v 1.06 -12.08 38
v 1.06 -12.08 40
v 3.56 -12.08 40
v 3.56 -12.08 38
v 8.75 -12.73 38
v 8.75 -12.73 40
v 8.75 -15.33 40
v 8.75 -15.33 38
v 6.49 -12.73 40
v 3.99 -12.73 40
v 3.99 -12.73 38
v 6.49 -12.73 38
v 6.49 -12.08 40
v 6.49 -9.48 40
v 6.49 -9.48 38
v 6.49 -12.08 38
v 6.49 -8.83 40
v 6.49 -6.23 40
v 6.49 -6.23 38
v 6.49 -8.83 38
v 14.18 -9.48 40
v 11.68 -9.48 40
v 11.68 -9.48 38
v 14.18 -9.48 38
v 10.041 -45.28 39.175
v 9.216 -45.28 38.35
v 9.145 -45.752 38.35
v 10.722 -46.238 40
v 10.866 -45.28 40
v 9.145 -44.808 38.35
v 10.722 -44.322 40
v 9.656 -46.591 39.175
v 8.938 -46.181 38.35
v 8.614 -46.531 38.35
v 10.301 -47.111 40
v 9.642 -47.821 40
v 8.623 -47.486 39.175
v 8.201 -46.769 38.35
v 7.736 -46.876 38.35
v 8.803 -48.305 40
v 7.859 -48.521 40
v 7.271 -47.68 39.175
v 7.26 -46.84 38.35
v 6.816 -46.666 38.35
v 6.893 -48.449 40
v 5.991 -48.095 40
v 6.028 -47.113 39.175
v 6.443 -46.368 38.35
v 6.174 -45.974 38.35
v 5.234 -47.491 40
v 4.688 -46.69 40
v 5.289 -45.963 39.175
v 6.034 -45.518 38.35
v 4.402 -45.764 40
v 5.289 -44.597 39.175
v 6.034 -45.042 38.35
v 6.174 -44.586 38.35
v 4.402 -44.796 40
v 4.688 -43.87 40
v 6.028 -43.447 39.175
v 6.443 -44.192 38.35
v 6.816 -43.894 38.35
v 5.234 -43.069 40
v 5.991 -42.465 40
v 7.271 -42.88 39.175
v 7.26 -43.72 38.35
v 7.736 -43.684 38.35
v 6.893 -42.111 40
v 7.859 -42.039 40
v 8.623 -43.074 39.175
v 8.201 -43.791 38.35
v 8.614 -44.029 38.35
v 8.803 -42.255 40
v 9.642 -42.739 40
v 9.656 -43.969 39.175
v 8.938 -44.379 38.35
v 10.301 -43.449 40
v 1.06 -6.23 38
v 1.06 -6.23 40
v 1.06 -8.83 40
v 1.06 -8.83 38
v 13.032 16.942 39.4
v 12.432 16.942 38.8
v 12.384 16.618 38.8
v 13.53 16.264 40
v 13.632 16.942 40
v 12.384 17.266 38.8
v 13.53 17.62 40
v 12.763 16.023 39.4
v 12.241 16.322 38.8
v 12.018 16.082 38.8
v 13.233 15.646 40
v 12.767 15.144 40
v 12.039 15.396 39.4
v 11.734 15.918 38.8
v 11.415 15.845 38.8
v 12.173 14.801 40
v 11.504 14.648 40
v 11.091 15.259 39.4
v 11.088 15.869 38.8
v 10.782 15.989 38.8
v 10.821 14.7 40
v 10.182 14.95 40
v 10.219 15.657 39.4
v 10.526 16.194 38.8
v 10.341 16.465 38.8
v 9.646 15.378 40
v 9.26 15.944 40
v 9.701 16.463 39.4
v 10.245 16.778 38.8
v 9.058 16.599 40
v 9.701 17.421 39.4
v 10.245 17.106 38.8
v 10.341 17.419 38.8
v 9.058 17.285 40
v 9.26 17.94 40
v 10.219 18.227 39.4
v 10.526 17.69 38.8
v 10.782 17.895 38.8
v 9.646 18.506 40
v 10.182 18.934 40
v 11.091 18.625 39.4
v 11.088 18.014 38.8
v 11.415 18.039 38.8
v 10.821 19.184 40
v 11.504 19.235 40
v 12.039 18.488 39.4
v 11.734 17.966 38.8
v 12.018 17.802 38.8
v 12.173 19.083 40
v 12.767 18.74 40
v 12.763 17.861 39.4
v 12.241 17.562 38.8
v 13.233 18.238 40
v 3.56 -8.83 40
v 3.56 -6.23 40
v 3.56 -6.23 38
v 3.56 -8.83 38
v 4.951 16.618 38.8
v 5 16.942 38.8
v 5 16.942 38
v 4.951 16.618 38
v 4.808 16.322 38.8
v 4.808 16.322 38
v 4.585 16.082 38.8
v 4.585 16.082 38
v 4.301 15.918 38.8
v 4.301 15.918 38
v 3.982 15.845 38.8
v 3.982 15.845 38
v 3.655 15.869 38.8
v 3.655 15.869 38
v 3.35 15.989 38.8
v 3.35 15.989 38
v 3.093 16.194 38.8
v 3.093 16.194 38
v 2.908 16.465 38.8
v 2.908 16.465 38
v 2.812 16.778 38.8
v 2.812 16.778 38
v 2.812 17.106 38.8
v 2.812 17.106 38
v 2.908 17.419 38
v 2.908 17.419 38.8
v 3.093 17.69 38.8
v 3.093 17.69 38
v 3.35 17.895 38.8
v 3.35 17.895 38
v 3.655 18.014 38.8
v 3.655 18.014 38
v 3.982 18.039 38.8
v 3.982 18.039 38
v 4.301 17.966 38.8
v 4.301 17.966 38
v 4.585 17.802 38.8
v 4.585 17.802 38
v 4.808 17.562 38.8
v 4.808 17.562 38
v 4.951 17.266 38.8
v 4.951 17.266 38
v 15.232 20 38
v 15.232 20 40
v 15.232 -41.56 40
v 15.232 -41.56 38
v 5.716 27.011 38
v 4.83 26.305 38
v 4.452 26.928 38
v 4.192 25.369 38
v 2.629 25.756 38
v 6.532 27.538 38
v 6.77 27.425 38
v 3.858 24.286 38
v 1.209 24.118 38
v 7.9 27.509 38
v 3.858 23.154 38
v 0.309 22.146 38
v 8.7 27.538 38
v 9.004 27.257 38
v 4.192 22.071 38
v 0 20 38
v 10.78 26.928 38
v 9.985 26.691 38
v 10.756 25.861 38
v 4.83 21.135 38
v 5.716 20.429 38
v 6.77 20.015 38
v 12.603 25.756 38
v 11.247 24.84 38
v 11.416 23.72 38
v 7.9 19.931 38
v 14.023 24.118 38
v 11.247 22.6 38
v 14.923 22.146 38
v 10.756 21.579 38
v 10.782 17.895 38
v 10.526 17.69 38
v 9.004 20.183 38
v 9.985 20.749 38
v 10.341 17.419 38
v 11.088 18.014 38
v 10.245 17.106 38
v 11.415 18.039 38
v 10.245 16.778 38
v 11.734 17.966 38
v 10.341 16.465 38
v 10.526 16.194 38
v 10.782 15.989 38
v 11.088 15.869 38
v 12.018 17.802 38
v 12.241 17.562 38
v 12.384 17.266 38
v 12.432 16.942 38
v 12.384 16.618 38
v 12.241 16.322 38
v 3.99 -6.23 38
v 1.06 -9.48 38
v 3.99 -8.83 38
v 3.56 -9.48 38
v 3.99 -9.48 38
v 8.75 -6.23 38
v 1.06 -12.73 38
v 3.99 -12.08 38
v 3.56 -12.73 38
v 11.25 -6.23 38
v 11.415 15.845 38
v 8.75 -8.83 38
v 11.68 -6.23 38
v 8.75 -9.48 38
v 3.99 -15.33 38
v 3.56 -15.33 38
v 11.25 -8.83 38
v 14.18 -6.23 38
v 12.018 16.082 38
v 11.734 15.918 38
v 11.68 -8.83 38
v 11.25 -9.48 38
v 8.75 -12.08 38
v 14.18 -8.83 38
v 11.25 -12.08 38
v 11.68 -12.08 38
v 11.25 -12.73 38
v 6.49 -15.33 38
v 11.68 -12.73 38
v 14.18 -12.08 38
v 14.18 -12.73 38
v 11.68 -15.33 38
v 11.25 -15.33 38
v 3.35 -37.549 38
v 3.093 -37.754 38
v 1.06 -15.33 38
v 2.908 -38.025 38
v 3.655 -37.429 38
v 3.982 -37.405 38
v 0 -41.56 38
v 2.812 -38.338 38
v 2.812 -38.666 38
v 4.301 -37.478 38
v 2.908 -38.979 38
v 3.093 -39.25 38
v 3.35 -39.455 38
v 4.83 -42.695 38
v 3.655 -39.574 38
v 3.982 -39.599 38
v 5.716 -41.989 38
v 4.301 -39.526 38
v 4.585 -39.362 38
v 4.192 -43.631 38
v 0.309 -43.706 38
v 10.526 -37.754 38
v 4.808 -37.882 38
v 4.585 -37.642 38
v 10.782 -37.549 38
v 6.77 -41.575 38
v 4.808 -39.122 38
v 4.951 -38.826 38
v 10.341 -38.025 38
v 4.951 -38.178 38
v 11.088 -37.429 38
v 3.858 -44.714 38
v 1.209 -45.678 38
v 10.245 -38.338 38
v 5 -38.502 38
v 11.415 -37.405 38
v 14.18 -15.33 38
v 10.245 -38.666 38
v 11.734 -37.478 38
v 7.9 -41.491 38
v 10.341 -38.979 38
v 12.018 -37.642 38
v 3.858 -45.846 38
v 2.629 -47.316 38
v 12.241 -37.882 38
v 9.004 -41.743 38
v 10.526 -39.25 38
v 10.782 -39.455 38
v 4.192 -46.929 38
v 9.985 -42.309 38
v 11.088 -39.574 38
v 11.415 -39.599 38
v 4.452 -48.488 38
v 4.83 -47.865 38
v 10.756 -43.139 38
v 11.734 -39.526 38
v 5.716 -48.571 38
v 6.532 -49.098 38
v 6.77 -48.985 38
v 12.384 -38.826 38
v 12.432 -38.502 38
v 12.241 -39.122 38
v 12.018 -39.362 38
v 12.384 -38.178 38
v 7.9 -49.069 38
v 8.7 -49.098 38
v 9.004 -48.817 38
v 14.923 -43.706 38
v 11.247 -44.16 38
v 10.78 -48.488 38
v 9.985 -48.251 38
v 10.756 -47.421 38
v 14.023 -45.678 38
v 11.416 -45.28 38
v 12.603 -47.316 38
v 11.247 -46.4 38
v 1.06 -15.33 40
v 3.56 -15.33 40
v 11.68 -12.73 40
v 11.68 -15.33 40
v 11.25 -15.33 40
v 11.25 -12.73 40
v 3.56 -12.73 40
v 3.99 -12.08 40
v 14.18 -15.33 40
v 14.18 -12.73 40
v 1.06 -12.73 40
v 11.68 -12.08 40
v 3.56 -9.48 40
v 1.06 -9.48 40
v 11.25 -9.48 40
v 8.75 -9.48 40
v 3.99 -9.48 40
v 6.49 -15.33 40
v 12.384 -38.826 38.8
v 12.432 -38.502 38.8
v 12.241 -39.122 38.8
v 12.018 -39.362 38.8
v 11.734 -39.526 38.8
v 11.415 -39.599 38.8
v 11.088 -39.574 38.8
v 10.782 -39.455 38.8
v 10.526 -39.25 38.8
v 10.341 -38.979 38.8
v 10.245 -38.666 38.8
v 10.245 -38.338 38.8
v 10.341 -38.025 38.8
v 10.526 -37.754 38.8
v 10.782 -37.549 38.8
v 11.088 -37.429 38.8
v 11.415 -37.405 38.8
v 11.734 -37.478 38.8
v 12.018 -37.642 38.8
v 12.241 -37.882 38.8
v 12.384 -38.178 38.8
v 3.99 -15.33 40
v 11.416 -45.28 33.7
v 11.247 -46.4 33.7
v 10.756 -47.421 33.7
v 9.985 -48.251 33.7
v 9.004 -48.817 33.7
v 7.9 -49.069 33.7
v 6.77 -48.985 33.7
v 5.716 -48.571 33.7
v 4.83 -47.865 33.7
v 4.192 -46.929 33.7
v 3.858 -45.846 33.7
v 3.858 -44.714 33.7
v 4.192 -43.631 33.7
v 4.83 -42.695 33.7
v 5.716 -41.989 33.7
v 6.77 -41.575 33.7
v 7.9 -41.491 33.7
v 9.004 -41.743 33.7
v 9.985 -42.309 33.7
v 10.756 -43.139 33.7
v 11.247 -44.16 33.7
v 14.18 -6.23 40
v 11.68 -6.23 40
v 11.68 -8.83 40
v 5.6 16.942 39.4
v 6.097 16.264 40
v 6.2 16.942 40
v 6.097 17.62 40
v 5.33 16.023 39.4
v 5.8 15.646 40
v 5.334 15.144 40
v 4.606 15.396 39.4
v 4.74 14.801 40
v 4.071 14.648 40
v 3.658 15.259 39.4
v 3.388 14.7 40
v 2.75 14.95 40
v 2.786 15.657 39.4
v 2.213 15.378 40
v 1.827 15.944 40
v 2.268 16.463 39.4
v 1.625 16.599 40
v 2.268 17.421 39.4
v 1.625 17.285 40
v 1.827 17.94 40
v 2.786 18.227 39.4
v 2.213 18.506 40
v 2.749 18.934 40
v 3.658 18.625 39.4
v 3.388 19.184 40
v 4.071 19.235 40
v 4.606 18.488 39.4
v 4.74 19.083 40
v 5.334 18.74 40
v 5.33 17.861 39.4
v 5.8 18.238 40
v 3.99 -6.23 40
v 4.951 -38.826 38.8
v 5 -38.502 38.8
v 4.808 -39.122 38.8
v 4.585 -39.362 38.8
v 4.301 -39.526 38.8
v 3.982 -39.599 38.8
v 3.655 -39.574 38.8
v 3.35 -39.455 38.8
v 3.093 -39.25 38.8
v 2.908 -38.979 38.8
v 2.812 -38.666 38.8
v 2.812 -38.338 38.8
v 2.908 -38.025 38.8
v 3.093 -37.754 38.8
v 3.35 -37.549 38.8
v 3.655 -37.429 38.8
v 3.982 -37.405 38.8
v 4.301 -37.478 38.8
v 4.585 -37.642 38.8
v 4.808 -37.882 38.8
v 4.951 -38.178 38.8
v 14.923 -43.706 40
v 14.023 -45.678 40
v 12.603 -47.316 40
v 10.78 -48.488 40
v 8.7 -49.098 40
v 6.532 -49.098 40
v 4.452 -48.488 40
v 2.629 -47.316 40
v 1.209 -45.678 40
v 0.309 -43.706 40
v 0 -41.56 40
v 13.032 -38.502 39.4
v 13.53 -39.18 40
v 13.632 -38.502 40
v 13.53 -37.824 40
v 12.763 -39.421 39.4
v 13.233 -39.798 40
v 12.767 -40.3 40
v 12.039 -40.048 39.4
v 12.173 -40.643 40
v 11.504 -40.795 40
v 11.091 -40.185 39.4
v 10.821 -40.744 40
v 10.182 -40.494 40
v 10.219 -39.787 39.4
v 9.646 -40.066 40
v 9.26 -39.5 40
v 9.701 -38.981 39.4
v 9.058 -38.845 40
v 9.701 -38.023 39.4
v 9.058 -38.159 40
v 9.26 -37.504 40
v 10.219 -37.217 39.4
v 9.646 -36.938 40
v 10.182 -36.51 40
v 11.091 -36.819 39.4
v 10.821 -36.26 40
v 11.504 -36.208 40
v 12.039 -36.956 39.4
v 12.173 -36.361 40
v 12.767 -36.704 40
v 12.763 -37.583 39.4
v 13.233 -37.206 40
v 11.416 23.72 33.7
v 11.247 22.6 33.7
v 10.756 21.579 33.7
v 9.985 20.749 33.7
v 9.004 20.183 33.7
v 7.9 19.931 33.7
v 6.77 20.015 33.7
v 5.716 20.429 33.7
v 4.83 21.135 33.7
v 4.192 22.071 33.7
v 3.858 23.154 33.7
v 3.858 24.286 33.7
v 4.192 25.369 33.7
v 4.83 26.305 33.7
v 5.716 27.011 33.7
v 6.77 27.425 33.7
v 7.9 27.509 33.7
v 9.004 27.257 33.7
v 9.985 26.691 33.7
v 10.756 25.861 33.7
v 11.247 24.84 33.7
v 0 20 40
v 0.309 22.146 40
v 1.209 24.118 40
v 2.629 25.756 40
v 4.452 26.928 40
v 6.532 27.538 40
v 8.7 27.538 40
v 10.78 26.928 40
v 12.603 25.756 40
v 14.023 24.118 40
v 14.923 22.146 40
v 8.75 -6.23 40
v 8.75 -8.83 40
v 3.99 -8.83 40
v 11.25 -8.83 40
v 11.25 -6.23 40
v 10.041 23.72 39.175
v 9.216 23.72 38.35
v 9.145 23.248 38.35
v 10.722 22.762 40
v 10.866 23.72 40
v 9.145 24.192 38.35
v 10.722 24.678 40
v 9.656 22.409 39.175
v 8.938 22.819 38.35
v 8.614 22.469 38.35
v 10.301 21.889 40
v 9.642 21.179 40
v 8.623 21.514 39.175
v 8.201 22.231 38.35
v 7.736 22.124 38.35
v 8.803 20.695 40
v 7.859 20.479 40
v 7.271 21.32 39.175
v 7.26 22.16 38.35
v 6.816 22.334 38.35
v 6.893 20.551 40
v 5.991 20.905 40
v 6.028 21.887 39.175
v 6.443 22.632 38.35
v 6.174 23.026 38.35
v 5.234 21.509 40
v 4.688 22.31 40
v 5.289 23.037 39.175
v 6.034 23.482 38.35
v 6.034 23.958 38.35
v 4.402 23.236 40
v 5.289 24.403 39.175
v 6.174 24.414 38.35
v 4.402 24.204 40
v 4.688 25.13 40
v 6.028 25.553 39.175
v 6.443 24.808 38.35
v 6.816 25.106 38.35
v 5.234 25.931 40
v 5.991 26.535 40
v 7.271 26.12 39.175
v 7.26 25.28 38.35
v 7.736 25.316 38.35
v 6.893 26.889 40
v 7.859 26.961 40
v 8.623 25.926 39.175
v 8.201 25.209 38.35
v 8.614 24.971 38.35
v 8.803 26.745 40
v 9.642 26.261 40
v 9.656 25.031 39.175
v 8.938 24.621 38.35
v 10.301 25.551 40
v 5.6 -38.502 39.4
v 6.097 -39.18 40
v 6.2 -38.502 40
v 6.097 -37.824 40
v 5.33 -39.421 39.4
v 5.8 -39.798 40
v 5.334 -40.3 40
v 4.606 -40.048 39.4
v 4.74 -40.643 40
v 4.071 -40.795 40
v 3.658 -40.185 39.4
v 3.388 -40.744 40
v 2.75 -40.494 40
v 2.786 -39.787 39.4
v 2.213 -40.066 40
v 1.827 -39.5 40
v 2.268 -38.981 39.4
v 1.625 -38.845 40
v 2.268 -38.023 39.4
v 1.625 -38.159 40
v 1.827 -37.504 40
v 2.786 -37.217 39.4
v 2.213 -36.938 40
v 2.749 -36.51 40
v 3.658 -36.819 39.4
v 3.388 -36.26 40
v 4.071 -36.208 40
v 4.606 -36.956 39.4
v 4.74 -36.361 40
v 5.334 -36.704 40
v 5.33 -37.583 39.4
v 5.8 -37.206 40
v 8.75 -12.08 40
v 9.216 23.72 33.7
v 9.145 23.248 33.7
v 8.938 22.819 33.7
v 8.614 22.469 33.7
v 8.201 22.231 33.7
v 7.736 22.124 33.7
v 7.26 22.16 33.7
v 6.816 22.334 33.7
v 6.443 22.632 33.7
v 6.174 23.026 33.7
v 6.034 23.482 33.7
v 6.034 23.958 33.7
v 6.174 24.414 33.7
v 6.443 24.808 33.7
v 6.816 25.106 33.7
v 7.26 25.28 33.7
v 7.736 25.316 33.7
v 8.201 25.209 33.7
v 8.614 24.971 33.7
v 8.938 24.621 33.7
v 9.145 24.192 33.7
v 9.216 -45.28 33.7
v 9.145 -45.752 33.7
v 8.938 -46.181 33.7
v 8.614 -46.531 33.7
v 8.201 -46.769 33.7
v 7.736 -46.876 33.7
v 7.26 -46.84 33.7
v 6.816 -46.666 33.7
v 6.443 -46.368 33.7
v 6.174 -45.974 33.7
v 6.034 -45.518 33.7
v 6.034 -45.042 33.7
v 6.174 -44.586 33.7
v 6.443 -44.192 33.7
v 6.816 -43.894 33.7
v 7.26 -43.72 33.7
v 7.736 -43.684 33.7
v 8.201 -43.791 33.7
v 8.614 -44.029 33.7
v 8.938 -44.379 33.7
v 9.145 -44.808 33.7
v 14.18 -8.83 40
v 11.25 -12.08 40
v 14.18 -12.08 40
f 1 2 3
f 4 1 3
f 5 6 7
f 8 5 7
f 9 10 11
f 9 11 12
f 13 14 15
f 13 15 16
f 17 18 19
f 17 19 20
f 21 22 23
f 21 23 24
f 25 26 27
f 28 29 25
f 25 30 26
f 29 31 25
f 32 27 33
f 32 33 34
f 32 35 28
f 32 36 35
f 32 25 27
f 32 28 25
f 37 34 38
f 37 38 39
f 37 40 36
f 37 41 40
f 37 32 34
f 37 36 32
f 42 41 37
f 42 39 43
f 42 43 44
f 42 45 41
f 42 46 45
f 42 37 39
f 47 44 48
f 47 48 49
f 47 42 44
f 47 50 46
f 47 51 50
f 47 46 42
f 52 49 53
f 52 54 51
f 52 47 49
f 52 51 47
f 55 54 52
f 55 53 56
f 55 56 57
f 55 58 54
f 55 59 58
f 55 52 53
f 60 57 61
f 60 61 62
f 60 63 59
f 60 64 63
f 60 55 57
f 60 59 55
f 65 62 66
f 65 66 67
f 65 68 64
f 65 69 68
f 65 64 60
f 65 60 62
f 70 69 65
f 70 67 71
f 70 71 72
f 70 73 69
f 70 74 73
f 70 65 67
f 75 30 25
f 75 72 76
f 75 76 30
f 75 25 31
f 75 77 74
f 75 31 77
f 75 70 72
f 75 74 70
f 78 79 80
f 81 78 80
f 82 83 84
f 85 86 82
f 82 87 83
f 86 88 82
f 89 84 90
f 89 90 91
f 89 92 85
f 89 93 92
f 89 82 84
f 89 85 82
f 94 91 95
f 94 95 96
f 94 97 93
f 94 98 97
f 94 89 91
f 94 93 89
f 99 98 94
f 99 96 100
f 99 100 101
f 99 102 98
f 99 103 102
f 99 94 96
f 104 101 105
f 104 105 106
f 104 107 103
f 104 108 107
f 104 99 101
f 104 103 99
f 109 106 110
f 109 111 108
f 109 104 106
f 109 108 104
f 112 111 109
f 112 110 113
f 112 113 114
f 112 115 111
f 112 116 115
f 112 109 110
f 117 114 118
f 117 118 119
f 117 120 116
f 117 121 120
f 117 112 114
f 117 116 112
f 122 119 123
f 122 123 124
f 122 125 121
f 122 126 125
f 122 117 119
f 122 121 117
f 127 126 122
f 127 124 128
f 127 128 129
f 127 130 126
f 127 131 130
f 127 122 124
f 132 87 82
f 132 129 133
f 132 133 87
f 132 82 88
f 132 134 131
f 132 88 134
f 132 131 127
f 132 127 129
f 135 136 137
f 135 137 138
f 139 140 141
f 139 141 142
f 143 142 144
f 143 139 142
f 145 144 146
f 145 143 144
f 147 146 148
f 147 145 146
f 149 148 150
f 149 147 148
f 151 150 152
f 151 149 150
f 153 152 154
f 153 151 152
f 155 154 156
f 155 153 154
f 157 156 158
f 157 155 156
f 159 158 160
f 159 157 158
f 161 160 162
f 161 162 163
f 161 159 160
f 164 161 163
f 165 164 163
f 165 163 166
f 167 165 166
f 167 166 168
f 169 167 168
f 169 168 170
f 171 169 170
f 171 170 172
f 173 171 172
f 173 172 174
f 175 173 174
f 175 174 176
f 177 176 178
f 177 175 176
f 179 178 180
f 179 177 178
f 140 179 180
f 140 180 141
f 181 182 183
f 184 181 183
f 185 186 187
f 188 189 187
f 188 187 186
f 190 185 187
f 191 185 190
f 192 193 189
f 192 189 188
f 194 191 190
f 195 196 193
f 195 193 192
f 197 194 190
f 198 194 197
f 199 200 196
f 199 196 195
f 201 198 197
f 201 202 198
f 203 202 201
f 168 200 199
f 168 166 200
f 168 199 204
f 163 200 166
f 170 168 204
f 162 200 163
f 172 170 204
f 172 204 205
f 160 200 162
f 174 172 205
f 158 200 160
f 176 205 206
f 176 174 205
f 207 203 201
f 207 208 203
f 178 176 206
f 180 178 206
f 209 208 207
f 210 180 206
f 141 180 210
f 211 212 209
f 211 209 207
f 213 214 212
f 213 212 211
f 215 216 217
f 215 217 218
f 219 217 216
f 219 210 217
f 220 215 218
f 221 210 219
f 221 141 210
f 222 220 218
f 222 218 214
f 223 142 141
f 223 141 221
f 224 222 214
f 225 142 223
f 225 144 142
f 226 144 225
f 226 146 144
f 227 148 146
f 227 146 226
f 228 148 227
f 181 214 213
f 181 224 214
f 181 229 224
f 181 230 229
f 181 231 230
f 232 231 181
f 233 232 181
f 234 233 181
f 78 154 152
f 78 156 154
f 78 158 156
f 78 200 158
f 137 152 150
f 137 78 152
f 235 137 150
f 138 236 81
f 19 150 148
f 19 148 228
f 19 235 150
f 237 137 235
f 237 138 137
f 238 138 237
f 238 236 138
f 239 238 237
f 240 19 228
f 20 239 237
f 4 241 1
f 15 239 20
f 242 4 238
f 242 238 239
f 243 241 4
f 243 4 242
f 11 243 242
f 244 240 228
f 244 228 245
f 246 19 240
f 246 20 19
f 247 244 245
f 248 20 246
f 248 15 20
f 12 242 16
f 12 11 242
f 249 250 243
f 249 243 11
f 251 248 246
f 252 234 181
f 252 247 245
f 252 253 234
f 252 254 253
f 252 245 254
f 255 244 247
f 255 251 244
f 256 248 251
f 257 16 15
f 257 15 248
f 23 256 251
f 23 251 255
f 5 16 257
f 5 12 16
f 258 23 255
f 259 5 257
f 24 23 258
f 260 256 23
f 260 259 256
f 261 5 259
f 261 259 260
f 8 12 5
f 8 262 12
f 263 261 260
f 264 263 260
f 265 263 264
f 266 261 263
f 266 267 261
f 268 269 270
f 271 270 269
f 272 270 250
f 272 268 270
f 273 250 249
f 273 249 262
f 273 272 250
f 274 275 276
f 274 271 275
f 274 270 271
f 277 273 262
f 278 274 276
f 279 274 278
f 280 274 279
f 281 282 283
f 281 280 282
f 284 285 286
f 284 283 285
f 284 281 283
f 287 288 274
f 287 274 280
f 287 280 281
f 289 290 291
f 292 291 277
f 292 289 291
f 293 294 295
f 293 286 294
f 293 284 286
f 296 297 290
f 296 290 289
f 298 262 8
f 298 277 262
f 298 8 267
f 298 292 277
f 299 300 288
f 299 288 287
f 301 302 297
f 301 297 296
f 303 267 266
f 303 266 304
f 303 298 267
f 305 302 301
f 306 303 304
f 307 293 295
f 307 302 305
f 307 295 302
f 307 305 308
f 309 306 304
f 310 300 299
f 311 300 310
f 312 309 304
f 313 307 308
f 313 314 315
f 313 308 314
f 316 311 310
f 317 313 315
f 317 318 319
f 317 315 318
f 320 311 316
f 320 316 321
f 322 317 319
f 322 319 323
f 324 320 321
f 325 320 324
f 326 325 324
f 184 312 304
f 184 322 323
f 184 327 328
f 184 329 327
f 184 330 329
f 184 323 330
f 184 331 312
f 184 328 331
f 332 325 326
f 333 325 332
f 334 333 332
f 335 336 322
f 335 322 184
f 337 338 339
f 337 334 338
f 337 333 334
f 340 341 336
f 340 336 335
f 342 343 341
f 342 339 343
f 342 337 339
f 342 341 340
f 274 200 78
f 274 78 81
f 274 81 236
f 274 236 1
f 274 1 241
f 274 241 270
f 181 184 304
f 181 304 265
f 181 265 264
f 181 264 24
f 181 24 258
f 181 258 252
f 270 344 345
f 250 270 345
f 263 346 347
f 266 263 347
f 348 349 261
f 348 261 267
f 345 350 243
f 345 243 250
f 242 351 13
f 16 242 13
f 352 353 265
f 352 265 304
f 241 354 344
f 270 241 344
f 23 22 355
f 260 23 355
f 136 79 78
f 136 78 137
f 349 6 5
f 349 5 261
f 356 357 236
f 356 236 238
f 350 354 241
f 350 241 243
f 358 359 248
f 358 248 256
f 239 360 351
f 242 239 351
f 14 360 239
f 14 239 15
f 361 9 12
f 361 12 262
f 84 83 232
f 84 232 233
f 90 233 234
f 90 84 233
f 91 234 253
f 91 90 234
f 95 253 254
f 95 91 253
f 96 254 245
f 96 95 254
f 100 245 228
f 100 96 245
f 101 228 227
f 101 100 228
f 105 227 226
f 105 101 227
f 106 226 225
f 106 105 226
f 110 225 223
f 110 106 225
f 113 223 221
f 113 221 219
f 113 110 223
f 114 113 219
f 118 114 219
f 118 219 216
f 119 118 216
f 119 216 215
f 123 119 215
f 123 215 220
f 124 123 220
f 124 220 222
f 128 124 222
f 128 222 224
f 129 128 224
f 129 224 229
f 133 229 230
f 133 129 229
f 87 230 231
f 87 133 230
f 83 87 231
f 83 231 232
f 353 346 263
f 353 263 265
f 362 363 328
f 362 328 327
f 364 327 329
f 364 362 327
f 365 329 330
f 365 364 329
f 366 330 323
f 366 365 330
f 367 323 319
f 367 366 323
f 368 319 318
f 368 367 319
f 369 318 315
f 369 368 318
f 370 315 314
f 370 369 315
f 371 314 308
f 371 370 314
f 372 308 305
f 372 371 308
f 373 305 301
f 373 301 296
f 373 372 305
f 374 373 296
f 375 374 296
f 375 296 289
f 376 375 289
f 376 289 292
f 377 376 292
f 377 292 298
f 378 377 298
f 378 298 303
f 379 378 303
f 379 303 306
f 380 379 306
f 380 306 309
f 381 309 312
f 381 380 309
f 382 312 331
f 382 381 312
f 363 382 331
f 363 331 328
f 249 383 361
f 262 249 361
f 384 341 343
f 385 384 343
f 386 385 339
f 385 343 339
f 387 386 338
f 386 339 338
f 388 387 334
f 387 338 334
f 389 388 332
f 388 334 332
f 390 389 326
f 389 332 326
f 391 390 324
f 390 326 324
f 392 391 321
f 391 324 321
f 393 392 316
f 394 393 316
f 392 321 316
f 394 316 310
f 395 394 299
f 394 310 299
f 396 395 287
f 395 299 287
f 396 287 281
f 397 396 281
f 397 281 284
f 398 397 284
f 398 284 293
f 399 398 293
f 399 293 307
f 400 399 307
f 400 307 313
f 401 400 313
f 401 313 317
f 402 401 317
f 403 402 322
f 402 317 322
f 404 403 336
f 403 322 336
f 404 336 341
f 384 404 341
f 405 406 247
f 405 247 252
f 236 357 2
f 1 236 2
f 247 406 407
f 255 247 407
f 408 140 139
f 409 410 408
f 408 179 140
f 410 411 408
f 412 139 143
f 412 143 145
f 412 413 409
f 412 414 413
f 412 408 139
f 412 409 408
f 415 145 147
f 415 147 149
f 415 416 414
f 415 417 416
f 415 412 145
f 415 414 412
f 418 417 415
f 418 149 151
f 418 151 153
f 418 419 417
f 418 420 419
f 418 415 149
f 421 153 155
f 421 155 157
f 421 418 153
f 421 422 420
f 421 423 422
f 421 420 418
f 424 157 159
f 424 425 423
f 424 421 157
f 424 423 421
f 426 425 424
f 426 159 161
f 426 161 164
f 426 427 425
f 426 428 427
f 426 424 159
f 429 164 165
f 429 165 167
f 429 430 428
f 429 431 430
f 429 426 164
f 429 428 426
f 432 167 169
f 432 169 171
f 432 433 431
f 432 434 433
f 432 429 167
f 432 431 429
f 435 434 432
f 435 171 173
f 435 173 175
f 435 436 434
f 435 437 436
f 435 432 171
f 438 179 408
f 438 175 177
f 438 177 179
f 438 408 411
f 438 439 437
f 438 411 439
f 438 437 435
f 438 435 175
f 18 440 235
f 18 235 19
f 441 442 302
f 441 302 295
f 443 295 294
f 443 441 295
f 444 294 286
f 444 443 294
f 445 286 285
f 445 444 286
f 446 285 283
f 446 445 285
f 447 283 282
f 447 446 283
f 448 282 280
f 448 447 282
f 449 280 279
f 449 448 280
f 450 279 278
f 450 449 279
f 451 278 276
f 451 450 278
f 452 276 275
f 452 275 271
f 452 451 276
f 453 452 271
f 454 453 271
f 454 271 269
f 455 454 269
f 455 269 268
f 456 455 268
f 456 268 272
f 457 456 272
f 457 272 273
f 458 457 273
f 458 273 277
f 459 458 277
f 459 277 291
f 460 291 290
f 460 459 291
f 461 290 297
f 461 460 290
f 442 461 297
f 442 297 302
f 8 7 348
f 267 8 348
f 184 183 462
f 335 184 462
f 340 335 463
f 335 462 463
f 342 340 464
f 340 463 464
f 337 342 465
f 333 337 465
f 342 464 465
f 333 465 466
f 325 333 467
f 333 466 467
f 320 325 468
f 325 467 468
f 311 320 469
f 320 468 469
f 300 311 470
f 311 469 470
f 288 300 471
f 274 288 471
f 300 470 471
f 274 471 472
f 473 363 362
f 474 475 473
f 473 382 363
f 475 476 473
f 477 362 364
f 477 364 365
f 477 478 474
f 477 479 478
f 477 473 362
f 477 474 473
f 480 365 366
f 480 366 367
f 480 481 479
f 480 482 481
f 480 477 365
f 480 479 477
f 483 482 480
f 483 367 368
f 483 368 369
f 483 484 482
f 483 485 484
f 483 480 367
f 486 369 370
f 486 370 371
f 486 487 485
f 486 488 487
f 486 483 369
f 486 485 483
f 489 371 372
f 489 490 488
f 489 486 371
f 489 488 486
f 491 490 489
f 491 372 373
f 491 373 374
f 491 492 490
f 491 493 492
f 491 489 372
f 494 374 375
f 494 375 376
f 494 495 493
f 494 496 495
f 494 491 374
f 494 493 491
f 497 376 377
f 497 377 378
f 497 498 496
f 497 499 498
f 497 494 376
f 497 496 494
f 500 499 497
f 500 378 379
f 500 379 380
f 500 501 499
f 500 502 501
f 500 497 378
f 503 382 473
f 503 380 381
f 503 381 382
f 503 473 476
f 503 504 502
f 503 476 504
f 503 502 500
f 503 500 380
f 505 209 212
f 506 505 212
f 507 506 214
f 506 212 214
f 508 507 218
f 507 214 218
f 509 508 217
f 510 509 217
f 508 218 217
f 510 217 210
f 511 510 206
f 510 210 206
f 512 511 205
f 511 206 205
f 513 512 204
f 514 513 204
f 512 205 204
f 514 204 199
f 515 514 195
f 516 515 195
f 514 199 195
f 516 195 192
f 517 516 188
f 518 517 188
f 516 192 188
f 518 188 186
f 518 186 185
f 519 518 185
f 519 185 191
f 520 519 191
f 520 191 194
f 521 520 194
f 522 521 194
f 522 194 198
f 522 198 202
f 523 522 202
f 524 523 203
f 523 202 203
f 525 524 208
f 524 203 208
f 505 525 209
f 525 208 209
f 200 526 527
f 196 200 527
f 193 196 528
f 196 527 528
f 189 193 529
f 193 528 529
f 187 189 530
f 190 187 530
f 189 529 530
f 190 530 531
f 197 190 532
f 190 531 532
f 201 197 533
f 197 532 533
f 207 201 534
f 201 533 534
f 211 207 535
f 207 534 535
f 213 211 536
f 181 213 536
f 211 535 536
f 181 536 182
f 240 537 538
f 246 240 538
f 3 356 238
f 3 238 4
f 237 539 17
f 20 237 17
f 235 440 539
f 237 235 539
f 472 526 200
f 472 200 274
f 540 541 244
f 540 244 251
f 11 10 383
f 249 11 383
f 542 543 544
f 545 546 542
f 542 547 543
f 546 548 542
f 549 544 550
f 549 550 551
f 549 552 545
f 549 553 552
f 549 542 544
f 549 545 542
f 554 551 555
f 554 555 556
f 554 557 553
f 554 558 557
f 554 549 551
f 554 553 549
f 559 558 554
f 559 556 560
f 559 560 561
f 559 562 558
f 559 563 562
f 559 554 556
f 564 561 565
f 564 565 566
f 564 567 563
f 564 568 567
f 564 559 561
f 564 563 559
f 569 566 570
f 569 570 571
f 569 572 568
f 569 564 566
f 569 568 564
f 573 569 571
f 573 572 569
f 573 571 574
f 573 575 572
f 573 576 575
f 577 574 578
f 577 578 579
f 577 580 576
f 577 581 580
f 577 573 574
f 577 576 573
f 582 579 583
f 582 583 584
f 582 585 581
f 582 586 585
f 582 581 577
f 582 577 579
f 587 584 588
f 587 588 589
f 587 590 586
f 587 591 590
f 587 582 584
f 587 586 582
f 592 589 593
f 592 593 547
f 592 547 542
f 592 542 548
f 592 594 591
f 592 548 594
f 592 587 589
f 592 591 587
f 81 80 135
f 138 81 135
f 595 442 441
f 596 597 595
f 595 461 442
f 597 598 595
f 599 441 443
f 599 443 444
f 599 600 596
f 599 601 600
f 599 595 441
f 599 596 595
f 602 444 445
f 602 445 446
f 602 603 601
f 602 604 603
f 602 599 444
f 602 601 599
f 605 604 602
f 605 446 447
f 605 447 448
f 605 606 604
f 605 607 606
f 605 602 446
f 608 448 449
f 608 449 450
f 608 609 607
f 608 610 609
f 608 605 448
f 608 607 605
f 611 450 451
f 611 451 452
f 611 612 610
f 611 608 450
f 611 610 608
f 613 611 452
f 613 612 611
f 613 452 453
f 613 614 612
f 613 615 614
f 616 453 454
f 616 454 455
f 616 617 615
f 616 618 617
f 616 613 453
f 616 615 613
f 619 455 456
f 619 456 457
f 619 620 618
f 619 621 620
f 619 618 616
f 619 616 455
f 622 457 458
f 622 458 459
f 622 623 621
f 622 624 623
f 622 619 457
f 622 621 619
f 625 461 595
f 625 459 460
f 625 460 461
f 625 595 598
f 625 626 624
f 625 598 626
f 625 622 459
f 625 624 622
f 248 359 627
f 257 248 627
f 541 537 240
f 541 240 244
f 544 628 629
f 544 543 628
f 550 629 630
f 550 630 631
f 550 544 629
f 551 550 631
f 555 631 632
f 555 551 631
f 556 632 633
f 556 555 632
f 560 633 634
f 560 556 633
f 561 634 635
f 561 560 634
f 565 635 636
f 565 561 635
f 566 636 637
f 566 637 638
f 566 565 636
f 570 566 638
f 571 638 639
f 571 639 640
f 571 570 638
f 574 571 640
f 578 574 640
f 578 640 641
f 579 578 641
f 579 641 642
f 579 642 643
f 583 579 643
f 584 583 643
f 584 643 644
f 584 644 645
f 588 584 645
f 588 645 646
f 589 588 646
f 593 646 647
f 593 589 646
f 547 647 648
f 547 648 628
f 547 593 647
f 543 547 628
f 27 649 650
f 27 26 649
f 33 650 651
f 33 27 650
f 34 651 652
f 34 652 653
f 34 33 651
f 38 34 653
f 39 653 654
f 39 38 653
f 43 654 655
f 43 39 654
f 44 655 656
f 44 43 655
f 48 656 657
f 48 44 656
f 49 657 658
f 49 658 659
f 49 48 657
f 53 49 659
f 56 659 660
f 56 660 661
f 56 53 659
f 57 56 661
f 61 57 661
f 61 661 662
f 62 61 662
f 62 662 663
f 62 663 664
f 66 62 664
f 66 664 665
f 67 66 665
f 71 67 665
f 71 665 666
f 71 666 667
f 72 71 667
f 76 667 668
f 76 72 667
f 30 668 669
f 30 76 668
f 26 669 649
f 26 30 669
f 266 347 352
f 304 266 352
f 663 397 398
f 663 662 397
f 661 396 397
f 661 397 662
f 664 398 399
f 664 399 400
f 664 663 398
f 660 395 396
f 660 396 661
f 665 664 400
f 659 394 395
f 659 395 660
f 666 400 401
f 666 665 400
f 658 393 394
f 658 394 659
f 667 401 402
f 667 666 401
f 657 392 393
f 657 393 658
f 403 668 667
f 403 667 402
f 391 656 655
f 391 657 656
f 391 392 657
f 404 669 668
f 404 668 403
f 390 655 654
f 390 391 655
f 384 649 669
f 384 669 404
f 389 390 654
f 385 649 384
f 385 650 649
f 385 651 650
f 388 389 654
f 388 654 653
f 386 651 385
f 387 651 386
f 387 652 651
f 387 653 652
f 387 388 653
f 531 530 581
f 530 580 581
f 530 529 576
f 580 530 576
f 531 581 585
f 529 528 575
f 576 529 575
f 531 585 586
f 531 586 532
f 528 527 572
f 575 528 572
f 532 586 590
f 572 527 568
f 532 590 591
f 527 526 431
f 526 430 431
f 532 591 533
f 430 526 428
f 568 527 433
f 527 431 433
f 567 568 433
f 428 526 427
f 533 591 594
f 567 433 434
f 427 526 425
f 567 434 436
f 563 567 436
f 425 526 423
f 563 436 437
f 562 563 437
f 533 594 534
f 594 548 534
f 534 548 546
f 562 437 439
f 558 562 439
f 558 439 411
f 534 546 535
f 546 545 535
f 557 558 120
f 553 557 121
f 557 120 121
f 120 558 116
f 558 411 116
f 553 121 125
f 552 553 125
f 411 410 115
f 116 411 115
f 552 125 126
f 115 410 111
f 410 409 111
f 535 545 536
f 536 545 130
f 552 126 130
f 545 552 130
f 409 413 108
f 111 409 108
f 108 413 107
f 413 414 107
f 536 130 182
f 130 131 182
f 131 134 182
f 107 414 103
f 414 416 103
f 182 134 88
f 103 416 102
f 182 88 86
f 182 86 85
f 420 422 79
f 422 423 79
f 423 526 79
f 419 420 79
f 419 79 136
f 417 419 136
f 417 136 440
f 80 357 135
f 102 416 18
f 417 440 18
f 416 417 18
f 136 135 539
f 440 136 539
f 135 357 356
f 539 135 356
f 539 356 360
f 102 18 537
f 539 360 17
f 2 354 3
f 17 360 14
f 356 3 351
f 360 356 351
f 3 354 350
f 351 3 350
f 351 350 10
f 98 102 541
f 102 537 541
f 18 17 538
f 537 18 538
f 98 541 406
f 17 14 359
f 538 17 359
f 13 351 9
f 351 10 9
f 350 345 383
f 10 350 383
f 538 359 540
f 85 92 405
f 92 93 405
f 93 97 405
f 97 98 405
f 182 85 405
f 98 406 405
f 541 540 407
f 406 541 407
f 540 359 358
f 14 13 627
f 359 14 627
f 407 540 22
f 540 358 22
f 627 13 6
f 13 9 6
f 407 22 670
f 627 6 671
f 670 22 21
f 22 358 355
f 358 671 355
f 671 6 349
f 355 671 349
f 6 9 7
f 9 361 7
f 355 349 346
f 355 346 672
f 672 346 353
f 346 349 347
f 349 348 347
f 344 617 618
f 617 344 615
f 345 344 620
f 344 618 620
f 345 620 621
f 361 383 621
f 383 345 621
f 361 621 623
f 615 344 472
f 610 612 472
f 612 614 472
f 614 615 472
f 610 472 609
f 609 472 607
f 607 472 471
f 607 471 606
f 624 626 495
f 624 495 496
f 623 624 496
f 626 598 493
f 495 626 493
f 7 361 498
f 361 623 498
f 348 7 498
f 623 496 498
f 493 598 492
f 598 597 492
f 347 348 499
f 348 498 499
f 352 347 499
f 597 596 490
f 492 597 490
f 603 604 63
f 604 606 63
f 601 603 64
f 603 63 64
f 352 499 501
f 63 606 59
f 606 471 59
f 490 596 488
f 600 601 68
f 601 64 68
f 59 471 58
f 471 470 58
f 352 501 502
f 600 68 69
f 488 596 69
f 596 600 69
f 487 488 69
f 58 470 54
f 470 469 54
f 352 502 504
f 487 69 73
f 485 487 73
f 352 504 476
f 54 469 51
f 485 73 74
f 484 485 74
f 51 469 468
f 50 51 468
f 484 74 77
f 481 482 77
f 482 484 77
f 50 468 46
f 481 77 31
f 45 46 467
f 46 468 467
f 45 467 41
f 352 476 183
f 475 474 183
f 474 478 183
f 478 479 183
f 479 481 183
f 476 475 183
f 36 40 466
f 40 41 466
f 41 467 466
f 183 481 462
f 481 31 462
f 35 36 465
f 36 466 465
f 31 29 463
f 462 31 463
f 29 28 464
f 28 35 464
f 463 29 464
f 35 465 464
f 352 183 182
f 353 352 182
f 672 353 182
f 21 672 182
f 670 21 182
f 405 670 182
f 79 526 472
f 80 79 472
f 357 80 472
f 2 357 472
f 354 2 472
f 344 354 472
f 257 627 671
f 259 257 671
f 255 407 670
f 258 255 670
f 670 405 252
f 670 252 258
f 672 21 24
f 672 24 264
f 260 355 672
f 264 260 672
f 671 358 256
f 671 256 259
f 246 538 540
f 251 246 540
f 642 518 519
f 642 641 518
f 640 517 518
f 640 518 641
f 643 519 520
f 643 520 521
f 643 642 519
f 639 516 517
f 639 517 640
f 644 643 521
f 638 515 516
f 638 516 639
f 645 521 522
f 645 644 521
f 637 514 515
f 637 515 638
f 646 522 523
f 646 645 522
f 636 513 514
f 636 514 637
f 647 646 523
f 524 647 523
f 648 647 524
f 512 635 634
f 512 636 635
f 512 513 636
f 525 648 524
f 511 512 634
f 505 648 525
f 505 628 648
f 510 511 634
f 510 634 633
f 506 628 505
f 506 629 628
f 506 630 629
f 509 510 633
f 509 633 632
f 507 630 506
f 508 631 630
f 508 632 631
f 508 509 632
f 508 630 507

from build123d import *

# Parameters (mm, degrees)
SKETCH002_R            = 1.6
PAD_DEPTH              = 2
CHAMFER_SIZE           = 1.65
CHAMFER003_SIZE        = 1.65
SKETCH005_W            = 15.232
SKETCH005_H            = 21.56
SKETCH005_W_2          = 2.5
SKETCH005_H_2          = 2.6
PAD003_DEPTH           = 2
SKETCH_R               = 3.8
SKETCH_R_2             = 1.6
PAD004_DEPTH           = 4.3
SKETCH001_W            = 15.232
SKETCH001_H            = 20
SKETCH001_R            = 1.1
PAD001_DEPTH           = 2
CHAMFER002_SIZE        = 1.2
FUSION_PLACEMENT_ANGLE = 180


with BuildPart() as chamfer003:
    # Sketch002 → Pad (new body)
    with BuildSketch(Plane.XY):
        with BuildLine():
            ThreePointArc((15.232, 41.56), (7.616, 49.176), (0, 41.56))
            Line((0, 41.56), (15.232, 41.56))
        make_face()
        with Locations((7.616, 45.28)):
            Circle(SKETCH002_R, mode=Mode.SUBTRACT)
        with BuildLine():
            ThreePointArc((0, -20), (7.616, -27.616), (15.232, -20))
            Line((0, -20), (15.232, -20))
        make_face()
        with Locations((7.616, -23.72)):
            Circle(SKETCH002_R, mode=Mode.SUBTRACT)
    extrude(amount=PAD_DEPTH)

    # Chamfer
    chamfer_edges = [chamfer003.edges().sort_by_distance(p)[0] for p in [
        (6.016, 45.28, 0),
    ]]
    chamfer(chamfer_edges, length=CHAMFER_SIZE)

    # Chamfer003
    chamfer003_edges = [chamfer003.edges().sort_by_distance(p)[0] for p in [
        (6.016, -23.72, 0),
    ]]
    chamfer(chamfer003_edges, length=CHAMFER003_SIZE)


with BuildPart() as pad003:
    # Sketch005 → Pad003 (new body)
    with BuildSketch(Plane.XY):
        with Locations((7.616, 10.78)):
            Rectangle(SKETCH005_W, SKETCH005_H)
        with Locations((2.3099, 10.78)):
            Rectangle(SKETCH005_W_2, SKETCH005_H_2, mode=Mode.SUBTRACT)
        with Locations((2.3099, 14.03)):
            Rectangle(SKETCH005_W_2, SKETCH005_H_2, mode=Mode.SUBTRACT)
        with Locations((2.3099, 7.53)):
            Rectangle(SKETCH005_W_2, SKETCH005_H_2, mode=Mode.SUBTRACT)
        with Locations((5.2399, 14.03)):
            Rectangle(SKETCH005_W_2, SKETCH005_H_2, mode=Mode.SUBTRACT)
        with Locations((5.2399, 10.78)):
            Rectangle(SKETCH005_W_2, SKETCH005_H_2, mode=Mode.SUBTRACT)
        with Locations((5.2399, 7.53)):
            Rectangle(SKETCH005_W_2, SKETCH005_H_2, mode=Mode.SUBTRACT)
        with Locations((10, 14.03)):
            Rectangle(SKETCH005_W_2, SKETCH005_H_2, mode=Mode.SUBTRACT)
        with Locations((12.93, 14.03)):
            Rectangle(SKETCH005_W_2, SKETCH005_H_2, mode=Mode.SUBTRACT)
        with Locations((10, 10.78)):
            Rectangle(SKETCH005_W_2, SKETCH005_H_2, mode=Mode.SUBTRACT)
        with Locations((12.93, 10.78)):
            Rectangle(SKETCH005_W_2, SKETCH005_H_2, mode=Mode.SUBTRACT)
        with Locations((10, 7.53)):
            Rectangle(SKETCH005_W_2, SKETCH005_H_2, mode=Mode.SUBTRACT)
        with Locations((12.93, 7.53)):
            Rectangle(SKETCH005_W_2, SKETCH005_H_2, mode=Mode.SUBTRACT)
    extrude(amount=PAD003_DEPTH)


with BuildPart() as pad004:
    # Sketch → Pad004 (new body)
    with BuildSketch(Plane.XY.offset(2)):
        with Locations((7.616, 45.28)):
            Circle(SKETCH_R)
        with Locations((7.616, 45.28)):
            Circle(SKETCH_R_2, mode=Mode.SUBTRACT)
        with Locations((7.616, -23.72)):
            Circle(SKETCH_R)
        with Locations((7.616, -23.72)):
            Circle(SKETCH_R_2, mode=Mode.SUBTRACT)
    extrude(amount=PAD004_DEPTH)


with BuildPart() as fusion:
    # Sketch001 → Pad001 (new body)
    with BuildSketch(Plane.XY):
        with Locations((7.616, -10)):
            Rectangle(SKETCH001_W, SKETCH001_H)
        with Locations((3.8995, -16.9419)):
            Circle(SKETCH001_R, mode=Mode.SUBTRACT)
        with Locations((11.3325, -16.9419)):
            Circle(SKETCH001_R, mode=Mode.SUBTRACT)
        with Locations((7.616, 31.56)):
            Rectangle(SKETCH001_W, SKETCH001_H)
        with Locations((3.8995, 38.5019)):
            Circle(SKETCH001_R, mode=Mode.SUBTRACT)
        with Locations((11.3325, 38.5019)):
            Circle(SKETCH001_R, mode=Mode.SUBTRACT)
    extrude(amount=PAD001_DEPTH)

    # Chamfer002
    chamfer002_edges = [fusion.edges().sort_by_distance(p)[0] for p in [
        (10.2325, -16.9419, 0),
        (2.7995, -16.9419, 0),
        (10.2325, 38.5019, 0),
        (2.7995, 38.5019, 0),
    ]]
    chamfer(chamfer002_edges, length=CHAMFER002_SIZE)

    # Fusion: union Chamfer003, Pad003, Pad004
    add(chamfer003.part)
    add(pad003.part)
    add(pad004.part)


with BuildPart() as fusion_1:
    # Fusion placement: moved
    add(fusion.part.moved(Location((0, 0, 40))).rotate(Axis((0, 0, 40), (1, 0, 0)), FUSION_PLACEMENT_ANGLE))


solid = fusion_1.part
